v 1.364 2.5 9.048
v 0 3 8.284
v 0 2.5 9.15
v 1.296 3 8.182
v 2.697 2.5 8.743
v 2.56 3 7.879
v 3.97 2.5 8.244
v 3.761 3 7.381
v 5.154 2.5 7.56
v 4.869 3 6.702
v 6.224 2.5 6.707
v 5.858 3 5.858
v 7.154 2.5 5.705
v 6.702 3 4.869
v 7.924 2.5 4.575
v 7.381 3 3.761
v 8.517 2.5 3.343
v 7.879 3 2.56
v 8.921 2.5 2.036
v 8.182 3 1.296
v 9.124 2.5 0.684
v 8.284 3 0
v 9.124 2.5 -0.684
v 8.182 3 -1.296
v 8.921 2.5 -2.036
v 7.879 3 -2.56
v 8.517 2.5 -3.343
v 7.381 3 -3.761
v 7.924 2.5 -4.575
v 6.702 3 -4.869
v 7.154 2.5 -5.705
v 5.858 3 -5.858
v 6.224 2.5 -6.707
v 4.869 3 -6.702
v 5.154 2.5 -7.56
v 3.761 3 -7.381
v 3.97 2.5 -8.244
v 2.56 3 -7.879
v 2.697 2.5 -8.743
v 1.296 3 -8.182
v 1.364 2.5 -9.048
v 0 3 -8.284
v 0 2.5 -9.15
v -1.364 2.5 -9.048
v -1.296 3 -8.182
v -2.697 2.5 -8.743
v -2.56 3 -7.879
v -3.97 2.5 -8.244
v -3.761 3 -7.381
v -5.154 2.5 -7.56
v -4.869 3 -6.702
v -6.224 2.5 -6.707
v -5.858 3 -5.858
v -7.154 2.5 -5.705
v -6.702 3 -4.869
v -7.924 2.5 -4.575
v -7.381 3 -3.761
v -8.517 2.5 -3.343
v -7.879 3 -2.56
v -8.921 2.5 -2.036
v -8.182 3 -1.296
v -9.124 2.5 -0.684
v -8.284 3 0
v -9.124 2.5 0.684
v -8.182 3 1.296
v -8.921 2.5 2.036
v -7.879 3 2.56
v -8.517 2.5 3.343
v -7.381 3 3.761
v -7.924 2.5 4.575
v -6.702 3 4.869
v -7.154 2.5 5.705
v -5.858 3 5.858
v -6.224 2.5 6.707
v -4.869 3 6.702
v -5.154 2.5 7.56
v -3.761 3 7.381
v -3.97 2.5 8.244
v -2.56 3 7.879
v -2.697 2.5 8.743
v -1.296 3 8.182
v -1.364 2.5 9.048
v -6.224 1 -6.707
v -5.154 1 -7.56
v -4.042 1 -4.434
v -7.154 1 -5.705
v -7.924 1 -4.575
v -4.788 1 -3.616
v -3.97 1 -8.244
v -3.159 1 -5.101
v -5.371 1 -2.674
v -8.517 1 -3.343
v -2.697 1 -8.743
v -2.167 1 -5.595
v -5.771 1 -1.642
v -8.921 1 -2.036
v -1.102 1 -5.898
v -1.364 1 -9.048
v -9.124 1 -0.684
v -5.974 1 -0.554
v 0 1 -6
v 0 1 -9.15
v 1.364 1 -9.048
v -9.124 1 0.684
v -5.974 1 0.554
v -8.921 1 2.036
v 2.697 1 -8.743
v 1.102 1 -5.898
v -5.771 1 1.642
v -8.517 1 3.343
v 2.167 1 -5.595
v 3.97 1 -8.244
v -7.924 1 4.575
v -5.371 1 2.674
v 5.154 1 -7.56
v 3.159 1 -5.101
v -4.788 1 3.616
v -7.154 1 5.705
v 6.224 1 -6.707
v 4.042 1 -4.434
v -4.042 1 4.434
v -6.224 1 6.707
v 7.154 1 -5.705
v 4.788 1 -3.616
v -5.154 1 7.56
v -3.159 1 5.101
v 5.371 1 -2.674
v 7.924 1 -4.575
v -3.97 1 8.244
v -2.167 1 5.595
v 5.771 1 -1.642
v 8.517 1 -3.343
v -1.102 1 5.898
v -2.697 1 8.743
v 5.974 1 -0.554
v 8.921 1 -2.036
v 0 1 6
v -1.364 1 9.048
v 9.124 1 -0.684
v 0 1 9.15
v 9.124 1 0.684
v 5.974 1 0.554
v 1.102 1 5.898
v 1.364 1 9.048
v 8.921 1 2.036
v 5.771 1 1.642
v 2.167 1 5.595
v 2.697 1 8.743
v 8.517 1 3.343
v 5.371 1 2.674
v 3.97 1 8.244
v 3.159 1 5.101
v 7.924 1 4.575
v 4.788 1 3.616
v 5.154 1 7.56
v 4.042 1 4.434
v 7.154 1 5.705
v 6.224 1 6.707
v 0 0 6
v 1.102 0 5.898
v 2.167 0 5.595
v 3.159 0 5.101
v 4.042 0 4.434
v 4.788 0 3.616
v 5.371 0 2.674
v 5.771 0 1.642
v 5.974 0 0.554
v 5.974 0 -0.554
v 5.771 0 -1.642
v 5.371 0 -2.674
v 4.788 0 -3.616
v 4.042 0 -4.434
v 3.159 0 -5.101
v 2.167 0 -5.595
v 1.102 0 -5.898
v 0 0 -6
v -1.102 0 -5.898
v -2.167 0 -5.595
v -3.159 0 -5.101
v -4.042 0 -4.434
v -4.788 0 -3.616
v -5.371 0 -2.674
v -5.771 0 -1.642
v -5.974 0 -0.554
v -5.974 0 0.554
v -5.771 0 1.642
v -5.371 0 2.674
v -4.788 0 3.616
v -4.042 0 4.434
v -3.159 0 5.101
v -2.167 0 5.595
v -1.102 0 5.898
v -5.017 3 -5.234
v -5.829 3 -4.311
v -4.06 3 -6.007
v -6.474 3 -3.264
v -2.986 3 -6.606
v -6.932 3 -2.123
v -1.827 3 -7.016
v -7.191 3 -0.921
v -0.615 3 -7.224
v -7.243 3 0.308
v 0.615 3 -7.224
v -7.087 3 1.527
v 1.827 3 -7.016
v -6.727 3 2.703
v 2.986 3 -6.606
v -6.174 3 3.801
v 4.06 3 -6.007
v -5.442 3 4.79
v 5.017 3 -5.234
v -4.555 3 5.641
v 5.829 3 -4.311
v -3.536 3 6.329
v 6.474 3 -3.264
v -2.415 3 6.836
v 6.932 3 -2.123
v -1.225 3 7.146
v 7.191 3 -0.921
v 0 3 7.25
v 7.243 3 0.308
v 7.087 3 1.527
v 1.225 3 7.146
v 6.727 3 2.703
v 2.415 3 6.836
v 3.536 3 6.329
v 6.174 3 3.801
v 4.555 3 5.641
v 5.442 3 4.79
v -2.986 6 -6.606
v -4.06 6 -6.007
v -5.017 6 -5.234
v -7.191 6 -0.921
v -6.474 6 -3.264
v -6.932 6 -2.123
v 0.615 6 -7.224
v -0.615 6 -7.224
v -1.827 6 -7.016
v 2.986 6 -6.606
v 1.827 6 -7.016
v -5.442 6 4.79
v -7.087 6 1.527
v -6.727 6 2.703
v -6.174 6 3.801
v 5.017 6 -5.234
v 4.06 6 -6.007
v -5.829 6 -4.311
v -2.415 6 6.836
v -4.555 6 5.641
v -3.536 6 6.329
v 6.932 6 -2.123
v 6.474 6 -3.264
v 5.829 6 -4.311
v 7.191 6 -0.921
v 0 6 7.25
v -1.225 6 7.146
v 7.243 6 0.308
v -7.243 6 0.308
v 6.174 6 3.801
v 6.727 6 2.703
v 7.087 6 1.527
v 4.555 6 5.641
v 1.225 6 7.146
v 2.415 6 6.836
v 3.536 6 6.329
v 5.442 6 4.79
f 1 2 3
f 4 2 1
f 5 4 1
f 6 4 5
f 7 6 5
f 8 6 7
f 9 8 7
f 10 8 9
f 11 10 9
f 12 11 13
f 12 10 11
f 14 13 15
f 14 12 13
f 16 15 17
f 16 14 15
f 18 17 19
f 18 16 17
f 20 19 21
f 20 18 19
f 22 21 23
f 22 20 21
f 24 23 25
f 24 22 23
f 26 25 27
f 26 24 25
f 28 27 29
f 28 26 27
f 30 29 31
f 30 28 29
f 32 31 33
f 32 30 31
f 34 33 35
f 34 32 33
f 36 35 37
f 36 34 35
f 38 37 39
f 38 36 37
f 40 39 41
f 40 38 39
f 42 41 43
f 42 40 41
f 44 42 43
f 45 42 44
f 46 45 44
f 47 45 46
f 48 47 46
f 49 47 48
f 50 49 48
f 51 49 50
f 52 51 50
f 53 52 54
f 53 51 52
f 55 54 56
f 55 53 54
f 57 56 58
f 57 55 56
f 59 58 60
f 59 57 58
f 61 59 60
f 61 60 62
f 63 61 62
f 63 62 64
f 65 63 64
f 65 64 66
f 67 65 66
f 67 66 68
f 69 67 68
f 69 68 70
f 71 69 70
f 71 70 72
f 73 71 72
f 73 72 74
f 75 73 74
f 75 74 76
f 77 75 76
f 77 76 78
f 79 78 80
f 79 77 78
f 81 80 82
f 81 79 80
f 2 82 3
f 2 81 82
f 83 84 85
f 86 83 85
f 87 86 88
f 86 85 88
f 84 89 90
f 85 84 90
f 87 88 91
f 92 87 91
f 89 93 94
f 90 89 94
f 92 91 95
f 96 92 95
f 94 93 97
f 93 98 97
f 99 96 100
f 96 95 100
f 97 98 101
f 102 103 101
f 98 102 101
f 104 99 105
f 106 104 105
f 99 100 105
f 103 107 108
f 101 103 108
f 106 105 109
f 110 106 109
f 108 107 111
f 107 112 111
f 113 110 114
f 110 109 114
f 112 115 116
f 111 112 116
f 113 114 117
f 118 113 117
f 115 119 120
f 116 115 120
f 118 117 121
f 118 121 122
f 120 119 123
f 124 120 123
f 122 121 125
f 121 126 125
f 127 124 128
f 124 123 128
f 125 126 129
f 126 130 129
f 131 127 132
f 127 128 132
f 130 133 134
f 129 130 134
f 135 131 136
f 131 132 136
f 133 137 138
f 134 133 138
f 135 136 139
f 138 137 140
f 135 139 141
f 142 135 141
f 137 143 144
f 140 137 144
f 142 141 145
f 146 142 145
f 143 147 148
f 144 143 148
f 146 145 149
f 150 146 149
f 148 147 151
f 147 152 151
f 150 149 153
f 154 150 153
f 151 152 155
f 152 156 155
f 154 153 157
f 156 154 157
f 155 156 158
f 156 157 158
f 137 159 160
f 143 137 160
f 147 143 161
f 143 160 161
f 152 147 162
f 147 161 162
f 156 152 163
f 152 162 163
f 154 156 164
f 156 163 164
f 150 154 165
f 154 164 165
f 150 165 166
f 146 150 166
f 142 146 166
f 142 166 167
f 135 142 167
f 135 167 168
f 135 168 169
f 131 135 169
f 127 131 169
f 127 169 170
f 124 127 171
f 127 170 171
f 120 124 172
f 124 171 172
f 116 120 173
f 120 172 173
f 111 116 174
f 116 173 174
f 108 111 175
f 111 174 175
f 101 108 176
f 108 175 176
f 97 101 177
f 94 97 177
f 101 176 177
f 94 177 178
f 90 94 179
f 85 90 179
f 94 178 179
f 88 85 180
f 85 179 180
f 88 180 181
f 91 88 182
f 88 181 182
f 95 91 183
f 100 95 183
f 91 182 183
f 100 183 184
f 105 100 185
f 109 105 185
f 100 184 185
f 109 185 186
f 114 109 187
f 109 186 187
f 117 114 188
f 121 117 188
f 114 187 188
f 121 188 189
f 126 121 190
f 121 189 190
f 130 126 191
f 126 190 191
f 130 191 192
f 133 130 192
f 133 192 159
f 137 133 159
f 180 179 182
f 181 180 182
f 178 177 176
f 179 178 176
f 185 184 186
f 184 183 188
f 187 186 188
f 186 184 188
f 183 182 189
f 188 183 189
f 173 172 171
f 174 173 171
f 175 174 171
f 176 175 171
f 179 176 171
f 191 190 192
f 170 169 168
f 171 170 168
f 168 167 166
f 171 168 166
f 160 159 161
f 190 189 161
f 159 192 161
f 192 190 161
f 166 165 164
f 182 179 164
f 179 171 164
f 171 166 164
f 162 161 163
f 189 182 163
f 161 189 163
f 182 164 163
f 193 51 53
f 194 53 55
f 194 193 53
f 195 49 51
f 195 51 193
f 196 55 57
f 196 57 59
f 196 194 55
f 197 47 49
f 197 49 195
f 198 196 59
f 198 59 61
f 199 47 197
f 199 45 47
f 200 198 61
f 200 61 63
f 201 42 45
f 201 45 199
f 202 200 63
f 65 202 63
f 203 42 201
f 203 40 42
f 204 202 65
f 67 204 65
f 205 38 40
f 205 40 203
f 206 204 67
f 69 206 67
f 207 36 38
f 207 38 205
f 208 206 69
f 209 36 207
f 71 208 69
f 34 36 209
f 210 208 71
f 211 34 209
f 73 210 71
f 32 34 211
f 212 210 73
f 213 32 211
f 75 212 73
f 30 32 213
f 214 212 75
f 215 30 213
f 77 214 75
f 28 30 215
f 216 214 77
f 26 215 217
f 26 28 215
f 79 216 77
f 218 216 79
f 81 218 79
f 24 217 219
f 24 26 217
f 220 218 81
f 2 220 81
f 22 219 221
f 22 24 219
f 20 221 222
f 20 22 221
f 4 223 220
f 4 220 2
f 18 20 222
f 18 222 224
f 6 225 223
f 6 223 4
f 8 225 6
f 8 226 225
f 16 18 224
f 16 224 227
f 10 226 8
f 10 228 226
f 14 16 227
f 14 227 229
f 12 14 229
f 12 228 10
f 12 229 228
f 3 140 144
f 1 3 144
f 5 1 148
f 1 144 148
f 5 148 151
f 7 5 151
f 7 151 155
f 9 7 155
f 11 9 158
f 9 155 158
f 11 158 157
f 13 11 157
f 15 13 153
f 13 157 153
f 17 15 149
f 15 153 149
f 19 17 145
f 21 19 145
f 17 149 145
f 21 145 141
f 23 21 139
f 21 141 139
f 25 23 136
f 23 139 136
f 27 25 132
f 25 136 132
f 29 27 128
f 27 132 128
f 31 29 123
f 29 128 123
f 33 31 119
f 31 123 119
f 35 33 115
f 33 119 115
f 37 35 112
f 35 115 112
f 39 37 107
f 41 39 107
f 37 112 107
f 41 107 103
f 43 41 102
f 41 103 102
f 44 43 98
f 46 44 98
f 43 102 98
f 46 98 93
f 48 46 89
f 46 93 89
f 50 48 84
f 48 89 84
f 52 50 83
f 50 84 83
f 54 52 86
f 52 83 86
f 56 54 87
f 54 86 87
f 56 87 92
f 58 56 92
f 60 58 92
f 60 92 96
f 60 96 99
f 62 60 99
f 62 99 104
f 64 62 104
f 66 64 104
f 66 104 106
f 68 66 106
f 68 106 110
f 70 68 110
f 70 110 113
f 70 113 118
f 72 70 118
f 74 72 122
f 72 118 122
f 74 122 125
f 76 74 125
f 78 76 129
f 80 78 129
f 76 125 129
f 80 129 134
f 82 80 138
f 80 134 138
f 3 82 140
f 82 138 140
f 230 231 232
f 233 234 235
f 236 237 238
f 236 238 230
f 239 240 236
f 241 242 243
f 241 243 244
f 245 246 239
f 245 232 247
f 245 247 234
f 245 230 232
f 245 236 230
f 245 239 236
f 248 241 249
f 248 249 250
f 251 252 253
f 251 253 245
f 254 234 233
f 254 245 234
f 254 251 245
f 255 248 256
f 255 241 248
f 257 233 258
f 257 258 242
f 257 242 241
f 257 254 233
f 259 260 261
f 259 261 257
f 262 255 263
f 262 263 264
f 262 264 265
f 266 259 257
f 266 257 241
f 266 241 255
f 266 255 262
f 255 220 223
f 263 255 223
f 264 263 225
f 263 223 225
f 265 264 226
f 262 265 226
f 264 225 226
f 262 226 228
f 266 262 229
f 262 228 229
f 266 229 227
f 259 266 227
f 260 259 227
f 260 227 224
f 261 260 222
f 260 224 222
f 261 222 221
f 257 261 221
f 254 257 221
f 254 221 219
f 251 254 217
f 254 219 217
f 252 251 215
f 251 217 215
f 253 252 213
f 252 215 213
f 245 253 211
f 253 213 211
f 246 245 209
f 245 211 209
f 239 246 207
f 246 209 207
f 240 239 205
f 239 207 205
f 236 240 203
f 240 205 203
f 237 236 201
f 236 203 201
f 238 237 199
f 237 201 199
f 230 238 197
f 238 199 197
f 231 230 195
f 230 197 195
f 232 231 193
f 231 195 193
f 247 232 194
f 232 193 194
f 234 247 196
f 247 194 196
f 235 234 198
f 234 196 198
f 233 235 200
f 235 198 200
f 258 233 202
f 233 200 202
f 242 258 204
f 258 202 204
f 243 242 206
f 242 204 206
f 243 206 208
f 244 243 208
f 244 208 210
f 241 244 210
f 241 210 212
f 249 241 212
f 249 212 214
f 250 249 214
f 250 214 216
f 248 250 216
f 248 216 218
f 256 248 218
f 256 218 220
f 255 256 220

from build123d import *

# Parameters (mm, degrees)
SKETCH5_R           = 6
BOSS_EXTRUDE3_DEPTH = 1
SKETCH6_R           = 9.15
BOSS_EXTRUDE4_DEPTH = 2
CHAMFER1_SIZE       = 0.5
CHAMFER1_SIZE2      = 0.866025404
SKETCH7_R           = 7.25
BOSS_EXTRUDE5_DEPTH = 3


with BuildPart() as part:
    # Sketch5 → Boss-Extrude3 (new body)
    with BuildSketch(Plane(origin=(0, 0, 0), x_dir=(1, 0, 0), z_dir=(0, 1, 0))):
        with Locations(Location((0, 0, 0), (0, 0, 270))):
            Circle(SKETCH5_R)
    extrude(amount=BOSS_EXTRUDE3_DEPTH)

    # Sketch6 → Boss-Extrude4 (add)
    with BuildSketch(Plane(origin=(0, 1, 0), x_dir=(1, 0, 0), z_dir=(0, 1, 0))):
        with Locations(Location((0, 0, 0), (0, 0, 270))):
            Circle(SKETCH6_R)
    extrude(amount=BOSS_EXTRUDE4_DEPTH)

    # Chamfer1
    chamfer1_edges = [part.edges().sort_by_distance(p)[0] for p in [
        (0, 3, -9.15),
    ]]
    chamfer1_side = [part.faces().sort_by_distance(p)[0] for p in [
        (0, 2, -9.15),
    ]]
    chamfer(chamfer1_edges, length=CHAMFER1_SIZE, length2=CHAMFER1_SIZE2, reference=chamfer1_side[0])

    # Sketch7 → Boss-Extrude5 (add)
    with BuildSketch(Plane(origin=(0, 3, 0), x_dir=(1, 0, 0), z_dir=(0, 1, 0))):
        with Locations(Location((0, 0, 0), (0, 0, 270))):
            Circle(SKETCH7_R)
    extrude(amount=BOSS_EXTRUDE5_DEPTH)


solid = part.part
